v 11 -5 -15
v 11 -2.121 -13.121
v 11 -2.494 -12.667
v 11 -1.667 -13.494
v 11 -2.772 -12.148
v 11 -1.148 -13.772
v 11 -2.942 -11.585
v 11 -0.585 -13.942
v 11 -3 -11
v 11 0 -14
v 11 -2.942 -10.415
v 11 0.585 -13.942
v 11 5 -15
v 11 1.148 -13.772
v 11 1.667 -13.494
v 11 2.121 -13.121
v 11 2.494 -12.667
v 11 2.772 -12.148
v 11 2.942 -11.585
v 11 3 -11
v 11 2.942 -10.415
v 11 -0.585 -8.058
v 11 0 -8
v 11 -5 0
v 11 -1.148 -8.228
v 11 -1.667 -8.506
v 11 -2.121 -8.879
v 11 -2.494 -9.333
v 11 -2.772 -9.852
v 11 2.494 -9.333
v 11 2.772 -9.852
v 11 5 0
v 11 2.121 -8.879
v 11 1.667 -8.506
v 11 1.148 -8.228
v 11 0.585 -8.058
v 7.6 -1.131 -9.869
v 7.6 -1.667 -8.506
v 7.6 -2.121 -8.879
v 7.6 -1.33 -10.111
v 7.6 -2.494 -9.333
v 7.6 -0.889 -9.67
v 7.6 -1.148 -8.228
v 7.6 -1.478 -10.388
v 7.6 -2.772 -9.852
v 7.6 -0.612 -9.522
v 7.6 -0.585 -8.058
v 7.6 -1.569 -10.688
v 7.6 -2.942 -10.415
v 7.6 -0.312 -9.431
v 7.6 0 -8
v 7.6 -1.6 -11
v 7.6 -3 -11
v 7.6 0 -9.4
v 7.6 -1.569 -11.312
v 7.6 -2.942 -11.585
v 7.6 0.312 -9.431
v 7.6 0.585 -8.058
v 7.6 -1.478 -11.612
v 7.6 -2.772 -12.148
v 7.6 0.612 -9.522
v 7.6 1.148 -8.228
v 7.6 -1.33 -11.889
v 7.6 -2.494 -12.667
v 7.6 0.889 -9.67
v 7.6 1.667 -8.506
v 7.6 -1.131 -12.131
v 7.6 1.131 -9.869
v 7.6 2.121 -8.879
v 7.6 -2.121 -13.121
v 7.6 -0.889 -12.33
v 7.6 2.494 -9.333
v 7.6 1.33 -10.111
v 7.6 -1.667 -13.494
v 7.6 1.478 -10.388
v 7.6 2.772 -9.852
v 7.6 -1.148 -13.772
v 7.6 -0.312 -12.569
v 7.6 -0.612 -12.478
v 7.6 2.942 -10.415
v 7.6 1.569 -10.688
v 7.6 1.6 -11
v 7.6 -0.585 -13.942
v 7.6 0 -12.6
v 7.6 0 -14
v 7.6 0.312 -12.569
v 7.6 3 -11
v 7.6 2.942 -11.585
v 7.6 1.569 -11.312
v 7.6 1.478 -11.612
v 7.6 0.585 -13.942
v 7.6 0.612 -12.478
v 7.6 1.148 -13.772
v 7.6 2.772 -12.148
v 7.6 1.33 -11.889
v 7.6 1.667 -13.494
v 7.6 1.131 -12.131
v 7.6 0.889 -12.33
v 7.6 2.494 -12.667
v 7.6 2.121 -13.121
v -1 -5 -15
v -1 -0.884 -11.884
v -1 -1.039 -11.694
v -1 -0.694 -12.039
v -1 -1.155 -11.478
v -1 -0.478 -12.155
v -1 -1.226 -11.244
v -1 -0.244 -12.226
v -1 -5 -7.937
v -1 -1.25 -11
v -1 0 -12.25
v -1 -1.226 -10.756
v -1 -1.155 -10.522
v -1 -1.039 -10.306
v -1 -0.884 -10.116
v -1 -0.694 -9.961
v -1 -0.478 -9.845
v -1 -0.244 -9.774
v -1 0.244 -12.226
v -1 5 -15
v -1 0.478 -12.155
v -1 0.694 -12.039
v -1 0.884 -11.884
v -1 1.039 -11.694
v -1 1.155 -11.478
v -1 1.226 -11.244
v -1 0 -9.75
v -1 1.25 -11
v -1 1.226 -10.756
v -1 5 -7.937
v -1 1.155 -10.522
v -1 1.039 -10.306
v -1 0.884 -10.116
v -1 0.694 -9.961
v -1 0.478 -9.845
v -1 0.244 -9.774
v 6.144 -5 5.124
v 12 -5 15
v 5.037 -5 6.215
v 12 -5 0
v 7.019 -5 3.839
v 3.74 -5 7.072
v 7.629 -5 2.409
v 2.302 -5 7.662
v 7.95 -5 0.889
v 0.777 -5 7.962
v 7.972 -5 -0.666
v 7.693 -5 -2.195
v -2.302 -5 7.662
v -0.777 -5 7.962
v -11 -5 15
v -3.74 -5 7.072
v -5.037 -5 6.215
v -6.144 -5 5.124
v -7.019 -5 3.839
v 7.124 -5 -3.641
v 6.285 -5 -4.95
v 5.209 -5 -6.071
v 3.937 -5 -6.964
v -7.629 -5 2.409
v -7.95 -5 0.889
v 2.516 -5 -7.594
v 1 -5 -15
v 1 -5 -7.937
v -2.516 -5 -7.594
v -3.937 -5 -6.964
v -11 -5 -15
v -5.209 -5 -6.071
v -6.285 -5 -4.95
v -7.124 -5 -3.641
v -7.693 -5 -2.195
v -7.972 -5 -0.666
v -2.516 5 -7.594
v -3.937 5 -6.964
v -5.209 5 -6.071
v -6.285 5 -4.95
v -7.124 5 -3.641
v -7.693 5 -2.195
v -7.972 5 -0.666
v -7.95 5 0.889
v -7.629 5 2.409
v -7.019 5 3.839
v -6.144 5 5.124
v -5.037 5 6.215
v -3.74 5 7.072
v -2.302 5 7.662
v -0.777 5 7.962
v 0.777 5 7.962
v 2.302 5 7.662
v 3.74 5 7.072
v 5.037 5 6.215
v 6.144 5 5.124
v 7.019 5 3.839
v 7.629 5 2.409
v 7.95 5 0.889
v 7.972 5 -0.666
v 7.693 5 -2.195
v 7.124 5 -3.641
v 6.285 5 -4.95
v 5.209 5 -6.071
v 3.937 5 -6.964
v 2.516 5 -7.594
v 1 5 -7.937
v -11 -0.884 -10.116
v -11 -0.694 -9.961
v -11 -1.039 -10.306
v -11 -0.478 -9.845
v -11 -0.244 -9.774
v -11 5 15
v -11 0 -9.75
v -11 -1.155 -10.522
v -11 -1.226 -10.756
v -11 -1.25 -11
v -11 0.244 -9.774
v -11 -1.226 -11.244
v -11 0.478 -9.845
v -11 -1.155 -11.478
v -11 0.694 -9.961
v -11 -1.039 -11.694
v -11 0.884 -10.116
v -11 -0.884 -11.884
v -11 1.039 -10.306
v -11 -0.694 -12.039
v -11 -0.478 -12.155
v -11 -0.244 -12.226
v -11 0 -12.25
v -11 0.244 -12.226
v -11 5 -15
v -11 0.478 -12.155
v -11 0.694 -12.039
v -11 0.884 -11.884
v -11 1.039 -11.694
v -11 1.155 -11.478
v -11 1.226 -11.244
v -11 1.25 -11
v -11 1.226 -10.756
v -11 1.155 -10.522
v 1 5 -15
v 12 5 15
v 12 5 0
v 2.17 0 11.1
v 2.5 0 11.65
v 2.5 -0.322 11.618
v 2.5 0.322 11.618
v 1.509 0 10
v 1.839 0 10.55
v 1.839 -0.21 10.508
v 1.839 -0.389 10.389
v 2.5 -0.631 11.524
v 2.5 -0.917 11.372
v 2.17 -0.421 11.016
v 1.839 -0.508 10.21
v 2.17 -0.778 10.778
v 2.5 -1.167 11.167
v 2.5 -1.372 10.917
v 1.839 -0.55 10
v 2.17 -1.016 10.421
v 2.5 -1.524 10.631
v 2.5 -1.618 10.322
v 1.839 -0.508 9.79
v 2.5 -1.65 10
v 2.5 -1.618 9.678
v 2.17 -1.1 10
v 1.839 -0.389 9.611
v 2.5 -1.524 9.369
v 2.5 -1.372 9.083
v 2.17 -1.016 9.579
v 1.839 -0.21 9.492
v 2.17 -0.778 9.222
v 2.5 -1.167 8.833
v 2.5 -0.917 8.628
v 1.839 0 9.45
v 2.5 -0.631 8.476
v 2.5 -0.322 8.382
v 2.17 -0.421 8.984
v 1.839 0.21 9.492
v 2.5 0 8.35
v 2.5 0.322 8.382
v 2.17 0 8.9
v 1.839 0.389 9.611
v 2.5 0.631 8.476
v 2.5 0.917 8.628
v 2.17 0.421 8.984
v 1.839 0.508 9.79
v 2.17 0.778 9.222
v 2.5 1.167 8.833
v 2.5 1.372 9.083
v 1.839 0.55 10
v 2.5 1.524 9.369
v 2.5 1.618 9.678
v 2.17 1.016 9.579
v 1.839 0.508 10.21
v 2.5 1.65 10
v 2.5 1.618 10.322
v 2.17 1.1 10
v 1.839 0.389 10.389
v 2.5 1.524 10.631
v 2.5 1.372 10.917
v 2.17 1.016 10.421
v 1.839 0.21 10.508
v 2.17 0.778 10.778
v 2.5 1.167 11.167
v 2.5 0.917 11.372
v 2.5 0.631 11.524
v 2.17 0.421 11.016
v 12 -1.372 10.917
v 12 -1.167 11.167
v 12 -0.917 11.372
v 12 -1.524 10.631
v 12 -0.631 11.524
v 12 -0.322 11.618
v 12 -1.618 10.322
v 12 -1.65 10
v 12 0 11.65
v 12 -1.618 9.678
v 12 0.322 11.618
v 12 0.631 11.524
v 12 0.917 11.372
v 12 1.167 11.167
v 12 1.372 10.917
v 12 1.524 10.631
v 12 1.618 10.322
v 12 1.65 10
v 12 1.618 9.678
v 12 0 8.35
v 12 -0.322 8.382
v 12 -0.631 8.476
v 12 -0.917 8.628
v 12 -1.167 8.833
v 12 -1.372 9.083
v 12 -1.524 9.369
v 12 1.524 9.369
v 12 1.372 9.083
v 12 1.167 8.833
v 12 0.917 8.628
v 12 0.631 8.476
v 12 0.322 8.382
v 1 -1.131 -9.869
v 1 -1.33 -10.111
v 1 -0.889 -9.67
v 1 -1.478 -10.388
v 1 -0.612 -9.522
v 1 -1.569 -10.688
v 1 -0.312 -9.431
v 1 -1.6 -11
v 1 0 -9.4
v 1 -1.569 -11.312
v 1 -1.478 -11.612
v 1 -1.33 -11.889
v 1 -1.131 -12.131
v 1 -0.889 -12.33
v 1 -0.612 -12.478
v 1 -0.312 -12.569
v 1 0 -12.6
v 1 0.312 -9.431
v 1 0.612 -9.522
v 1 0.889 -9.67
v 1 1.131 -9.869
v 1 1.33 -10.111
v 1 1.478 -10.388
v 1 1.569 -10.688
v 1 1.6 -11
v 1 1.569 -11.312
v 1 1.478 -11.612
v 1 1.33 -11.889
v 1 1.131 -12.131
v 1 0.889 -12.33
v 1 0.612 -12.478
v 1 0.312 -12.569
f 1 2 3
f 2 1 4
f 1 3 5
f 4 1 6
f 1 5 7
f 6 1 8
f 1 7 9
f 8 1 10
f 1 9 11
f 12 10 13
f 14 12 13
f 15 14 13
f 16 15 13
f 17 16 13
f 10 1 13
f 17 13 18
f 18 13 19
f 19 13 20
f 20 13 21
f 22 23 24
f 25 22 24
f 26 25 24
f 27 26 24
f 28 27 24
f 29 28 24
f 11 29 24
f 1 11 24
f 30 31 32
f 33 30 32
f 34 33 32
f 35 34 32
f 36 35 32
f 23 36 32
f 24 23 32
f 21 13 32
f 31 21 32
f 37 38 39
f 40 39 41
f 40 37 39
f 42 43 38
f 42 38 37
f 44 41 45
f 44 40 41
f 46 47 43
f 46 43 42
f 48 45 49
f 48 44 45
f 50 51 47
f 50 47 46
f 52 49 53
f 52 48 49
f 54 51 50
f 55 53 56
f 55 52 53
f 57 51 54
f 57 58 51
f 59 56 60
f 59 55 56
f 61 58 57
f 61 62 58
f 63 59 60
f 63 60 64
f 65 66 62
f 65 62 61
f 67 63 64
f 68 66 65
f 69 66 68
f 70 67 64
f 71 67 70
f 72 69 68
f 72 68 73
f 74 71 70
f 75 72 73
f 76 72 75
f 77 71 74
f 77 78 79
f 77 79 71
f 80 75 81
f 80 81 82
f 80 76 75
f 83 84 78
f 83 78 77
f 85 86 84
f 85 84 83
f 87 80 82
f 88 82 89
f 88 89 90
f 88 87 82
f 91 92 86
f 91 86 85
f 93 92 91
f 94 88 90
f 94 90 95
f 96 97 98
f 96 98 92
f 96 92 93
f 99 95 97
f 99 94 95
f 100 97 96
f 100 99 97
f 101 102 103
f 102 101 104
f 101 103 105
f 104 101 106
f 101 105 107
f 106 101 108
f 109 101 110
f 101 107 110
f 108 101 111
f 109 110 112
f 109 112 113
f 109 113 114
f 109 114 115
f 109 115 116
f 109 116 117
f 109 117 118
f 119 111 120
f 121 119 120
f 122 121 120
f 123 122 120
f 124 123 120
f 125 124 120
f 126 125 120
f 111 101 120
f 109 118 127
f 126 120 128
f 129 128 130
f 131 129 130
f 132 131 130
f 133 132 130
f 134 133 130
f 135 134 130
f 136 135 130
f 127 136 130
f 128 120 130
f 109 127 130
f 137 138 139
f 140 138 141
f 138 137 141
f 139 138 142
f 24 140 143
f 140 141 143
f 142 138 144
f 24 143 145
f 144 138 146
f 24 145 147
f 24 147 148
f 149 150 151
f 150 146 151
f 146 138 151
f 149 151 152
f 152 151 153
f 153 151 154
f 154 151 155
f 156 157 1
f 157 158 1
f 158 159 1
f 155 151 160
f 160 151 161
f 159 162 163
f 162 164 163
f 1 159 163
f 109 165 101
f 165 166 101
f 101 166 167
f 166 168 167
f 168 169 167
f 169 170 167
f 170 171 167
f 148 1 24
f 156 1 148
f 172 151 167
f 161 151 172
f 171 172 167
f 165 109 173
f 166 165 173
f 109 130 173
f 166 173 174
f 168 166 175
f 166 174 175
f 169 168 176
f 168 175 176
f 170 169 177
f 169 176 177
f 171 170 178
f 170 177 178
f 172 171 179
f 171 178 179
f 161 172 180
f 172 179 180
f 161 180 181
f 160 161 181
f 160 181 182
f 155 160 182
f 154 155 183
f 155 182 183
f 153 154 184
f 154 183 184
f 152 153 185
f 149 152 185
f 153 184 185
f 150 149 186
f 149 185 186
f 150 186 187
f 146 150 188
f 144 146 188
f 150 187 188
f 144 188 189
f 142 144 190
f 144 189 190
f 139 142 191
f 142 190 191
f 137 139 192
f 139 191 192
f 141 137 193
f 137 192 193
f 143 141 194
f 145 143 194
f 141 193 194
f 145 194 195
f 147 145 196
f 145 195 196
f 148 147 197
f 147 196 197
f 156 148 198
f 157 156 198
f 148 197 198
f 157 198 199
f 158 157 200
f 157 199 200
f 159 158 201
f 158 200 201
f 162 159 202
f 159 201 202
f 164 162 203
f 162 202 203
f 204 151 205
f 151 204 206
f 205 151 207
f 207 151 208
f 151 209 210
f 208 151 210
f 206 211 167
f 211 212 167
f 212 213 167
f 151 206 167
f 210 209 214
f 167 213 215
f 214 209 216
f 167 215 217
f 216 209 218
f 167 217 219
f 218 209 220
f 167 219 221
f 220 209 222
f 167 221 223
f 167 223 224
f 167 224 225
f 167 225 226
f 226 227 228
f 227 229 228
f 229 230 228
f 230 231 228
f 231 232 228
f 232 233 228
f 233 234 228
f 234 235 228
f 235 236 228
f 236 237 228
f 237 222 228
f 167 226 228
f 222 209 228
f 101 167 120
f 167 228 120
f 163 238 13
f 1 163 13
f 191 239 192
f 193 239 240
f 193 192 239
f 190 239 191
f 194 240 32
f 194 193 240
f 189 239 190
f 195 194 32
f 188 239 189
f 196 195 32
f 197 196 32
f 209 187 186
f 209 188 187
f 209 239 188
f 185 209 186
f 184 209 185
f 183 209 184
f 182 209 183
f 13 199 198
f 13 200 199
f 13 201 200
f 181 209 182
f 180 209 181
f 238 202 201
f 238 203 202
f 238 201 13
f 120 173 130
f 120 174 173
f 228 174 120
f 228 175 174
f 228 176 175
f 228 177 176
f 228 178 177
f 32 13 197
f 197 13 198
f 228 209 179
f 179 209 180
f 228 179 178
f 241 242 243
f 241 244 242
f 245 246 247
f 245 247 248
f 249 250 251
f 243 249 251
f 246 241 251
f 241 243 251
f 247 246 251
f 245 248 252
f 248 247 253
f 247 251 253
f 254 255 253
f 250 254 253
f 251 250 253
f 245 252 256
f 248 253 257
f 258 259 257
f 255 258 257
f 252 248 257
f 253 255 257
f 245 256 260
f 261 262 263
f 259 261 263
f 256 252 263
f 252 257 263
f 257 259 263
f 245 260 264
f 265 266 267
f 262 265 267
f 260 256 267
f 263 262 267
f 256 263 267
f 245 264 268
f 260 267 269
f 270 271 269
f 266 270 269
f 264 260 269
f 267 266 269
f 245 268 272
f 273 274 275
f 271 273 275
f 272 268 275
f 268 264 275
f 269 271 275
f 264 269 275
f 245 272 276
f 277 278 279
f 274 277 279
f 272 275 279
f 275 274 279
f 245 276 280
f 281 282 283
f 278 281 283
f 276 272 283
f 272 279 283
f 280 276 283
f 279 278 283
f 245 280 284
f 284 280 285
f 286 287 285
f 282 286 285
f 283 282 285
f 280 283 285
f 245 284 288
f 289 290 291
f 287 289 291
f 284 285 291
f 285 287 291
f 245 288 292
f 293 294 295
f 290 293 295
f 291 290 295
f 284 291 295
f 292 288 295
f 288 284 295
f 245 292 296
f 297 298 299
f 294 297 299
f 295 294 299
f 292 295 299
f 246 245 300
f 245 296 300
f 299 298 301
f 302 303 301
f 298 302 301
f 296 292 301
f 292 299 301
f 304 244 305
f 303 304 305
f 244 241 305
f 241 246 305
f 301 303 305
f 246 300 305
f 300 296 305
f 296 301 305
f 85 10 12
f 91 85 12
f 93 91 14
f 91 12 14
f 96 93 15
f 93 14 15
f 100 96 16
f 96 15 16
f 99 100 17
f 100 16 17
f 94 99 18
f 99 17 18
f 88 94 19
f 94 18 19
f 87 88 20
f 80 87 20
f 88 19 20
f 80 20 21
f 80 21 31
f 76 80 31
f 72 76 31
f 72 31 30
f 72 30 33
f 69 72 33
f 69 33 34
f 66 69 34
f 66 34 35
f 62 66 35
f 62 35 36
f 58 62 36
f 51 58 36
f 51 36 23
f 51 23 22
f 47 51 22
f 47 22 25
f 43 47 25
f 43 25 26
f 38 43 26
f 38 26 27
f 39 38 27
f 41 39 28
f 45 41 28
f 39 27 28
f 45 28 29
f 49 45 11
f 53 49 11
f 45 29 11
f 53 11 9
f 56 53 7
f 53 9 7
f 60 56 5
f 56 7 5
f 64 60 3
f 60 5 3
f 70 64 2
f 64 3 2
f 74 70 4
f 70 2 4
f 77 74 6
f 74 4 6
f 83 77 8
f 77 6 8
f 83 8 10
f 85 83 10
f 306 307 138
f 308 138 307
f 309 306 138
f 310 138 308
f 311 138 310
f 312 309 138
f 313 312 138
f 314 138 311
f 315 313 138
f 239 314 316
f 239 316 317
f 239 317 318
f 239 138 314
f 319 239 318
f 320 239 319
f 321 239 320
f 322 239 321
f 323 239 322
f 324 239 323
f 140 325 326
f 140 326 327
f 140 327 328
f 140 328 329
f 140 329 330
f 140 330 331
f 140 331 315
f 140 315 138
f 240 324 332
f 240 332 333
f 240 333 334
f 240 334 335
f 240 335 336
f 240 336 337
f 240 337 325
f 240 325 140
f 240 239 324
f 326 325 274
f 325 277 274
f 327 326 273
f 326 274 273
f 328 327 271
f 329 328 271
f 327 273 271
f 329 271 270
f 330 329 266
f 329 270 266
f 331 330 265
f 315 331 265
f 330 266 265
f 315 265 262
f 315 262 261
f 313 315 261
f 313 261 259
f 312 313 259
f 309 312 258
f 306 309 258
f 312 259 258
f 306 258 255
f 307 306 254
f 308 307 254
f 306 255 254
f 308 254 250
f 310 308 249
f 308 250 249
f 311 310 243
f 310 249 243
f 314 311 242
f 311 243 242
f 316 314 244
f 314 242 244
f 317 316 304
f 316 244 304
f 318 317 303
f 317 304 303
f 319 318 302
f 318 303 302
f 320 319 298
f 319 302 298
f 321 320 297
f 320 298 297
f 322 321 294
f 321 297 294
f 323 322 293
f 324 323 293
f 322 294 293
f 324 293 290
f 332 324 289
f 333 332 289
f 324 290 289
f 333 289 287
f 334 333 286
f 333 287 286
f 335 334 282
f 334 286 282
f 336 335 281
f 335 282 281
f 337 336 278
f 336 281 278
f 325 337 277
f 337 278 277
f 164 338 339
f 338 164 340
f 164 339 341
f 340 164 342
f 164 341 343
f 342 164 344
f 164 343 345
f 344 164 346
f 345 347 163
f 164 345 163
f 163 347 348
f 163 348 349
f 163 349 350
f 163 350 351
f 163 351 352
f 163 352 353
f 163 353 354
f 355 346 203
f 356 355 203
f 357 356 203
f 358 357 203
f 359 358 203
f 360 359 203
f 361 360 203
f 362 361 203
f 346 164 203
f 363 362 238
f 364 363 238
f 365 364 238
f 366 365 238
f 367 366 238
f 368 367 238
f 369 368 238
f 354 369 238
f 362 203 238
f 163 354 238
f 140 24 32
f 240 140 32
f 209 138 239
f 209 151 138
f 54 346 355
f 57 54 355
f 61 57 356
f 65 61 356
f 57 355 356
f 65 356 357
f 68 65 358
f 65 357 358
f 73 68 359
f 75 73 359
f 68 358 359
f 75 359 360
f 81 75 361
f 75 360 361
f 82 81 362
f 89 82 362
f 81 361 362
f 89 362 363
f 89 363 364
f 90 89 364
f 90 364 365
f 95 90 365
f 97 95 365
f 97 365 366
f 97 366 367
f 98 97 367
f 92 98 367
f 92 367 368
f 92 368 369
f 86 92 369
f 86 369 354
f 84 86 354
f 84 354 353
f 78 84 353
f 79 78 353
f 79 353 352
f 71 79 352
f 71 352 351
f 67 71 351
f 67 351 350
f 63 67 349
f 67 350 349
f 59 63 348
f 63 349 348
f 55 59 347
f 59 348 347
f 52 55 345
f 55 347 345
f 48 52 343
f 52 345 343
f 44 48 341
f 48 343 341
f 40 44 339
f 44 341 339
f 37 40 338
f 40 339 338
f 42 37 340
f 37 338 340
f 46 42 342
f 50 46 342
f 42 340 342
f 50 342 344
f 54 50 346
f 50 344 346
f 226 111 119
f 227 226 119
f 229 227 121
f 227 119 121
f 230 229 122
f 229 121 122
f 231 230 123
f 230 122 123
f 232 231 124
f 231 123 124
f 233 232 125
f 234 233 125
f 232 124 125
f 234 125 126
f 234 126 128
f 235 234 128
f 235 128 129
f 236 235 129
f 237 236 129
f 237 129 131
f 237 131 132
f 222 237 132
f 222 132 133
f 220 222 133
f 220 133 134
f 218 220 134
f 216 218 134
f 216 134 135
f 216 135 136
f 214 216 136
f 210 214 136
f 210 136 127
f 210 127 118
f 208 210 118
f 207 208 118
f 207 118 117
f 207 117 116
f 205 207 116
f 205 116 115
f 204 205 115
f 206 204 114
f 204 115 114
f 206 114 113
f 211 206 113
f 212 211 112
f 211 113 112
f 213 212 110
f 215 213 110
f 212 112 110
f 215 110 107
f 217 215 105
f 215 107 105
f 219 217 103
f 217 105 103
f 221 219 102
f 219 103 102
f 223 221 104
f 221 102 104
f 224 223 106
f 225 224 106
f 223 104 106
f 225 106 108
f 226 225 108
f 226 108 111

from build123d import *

# Parameters (mm, degrees)
EXTRUDE_1_DEPTH           = 5
HOLE_WIZARD_1_D           = 3.2
HOLE_WIZARD_1_DEPTH       = 10
HOLE_WIZARD_1_CBORE_D     = 6
HOLE_WIZARD_1_CBORE_DEPTH = 3.4
HOLE_WIZARD_M3_1_D        = 2.5
SKETCH_9_W                = 15
SKETCH_9_H                = 10
EXTRUDE_2_DEPTH           = 1
HOLE_WIZARD_M4_1_D        = 3.3
HOLE_WIZARD_M4_1_DEPTH    = 9.5
HOLE_WIZARD_M4_1_TIP      = 0.991420021


with BuildPart() as part:
    # 草图1 → 凸台-拉伸1 (new, symmetric)
    with BuildSketch(Plane(origin=(0, 0, 0), x_dir=(1, 0, 0), z_dir=(0, 1, 0))):
        with BuildLine():
            Line((11, -15), (-11, -15))
            Line((-11, -15), (-11, 15))
            Line((-11, 15), (-1, 15))
            Line((-1, 15), (-1, 7.937253933))
            ThreePointArc((-1, 7.937253933), (0, -8), (1, 7.937253933))
            Line((1, 7.937253933), (1, 15))
            Line((1, 15), (11, 15))
            Line((11, 15), (11, -15))
        make_face()
    extrude(amount=EXTRUDE_1_DEPTH, both=True)

    # 打孔尺寸(%根据)内六角圆柱头螺钉的类型1
    with Locations(Plane(origin=(11, 0, 0), x_dir=(0, 0, -1), z_dir=(1, 0, 0))):
        with Locations((11, 0)):
            CounterBoreHole(HOLE_WIZARD_1_D / 2, HOLE_WIZARD_1_CBORE_D / 2, HOLE_WIZARD_1_CBORE_DEPTH, depth=HOLE_WIZARD_1_DEPTH)

    # M3 螺纹孔1 (through all)
    with Locations(Plane.ZY.offset(11)):
        with Locations((-11, 0)):
            Hole(HOLE_WIZARD_M3_1_D / 2)

    # 草图9 → 凸台-拉伸2 (add)
    with BuildSketch(Plane(origin=(11, 0, 0), x_dir=(0, 0, -1), z_dir=(1, 0, 0))):
        with Locations((-7.5, 0)):
            Rectangle(SKETCH_9_W, SKETCH_9_H)
    extrude(amount=EXTRUDE_2_DEPTH)

    # M4 螺纹孔1
    with Locations(Plane(origin=(12, 0, 7), x_dir=(0, 0, 1), z_dir=(1, 0, 0))):
        with Locations((3, 0)):
            Hole(HOLE_WIZARD_M4_1_D / 2, depth=HOLE_WIZARD_M4_1_DEPTH)
            with Locations((0, 0, -(HOLE_WIZARD_M4_1_DEPTH + HOLE_WIZARD_M4_1_TIP / 2))):  # 118° drill point
                Cone(0, HOLE_WIZARD_M4_1_D / 2, HOLE_WIZARD_M4_1_TIP, mode=Mode.SUBTRACT)


solid = part.part
